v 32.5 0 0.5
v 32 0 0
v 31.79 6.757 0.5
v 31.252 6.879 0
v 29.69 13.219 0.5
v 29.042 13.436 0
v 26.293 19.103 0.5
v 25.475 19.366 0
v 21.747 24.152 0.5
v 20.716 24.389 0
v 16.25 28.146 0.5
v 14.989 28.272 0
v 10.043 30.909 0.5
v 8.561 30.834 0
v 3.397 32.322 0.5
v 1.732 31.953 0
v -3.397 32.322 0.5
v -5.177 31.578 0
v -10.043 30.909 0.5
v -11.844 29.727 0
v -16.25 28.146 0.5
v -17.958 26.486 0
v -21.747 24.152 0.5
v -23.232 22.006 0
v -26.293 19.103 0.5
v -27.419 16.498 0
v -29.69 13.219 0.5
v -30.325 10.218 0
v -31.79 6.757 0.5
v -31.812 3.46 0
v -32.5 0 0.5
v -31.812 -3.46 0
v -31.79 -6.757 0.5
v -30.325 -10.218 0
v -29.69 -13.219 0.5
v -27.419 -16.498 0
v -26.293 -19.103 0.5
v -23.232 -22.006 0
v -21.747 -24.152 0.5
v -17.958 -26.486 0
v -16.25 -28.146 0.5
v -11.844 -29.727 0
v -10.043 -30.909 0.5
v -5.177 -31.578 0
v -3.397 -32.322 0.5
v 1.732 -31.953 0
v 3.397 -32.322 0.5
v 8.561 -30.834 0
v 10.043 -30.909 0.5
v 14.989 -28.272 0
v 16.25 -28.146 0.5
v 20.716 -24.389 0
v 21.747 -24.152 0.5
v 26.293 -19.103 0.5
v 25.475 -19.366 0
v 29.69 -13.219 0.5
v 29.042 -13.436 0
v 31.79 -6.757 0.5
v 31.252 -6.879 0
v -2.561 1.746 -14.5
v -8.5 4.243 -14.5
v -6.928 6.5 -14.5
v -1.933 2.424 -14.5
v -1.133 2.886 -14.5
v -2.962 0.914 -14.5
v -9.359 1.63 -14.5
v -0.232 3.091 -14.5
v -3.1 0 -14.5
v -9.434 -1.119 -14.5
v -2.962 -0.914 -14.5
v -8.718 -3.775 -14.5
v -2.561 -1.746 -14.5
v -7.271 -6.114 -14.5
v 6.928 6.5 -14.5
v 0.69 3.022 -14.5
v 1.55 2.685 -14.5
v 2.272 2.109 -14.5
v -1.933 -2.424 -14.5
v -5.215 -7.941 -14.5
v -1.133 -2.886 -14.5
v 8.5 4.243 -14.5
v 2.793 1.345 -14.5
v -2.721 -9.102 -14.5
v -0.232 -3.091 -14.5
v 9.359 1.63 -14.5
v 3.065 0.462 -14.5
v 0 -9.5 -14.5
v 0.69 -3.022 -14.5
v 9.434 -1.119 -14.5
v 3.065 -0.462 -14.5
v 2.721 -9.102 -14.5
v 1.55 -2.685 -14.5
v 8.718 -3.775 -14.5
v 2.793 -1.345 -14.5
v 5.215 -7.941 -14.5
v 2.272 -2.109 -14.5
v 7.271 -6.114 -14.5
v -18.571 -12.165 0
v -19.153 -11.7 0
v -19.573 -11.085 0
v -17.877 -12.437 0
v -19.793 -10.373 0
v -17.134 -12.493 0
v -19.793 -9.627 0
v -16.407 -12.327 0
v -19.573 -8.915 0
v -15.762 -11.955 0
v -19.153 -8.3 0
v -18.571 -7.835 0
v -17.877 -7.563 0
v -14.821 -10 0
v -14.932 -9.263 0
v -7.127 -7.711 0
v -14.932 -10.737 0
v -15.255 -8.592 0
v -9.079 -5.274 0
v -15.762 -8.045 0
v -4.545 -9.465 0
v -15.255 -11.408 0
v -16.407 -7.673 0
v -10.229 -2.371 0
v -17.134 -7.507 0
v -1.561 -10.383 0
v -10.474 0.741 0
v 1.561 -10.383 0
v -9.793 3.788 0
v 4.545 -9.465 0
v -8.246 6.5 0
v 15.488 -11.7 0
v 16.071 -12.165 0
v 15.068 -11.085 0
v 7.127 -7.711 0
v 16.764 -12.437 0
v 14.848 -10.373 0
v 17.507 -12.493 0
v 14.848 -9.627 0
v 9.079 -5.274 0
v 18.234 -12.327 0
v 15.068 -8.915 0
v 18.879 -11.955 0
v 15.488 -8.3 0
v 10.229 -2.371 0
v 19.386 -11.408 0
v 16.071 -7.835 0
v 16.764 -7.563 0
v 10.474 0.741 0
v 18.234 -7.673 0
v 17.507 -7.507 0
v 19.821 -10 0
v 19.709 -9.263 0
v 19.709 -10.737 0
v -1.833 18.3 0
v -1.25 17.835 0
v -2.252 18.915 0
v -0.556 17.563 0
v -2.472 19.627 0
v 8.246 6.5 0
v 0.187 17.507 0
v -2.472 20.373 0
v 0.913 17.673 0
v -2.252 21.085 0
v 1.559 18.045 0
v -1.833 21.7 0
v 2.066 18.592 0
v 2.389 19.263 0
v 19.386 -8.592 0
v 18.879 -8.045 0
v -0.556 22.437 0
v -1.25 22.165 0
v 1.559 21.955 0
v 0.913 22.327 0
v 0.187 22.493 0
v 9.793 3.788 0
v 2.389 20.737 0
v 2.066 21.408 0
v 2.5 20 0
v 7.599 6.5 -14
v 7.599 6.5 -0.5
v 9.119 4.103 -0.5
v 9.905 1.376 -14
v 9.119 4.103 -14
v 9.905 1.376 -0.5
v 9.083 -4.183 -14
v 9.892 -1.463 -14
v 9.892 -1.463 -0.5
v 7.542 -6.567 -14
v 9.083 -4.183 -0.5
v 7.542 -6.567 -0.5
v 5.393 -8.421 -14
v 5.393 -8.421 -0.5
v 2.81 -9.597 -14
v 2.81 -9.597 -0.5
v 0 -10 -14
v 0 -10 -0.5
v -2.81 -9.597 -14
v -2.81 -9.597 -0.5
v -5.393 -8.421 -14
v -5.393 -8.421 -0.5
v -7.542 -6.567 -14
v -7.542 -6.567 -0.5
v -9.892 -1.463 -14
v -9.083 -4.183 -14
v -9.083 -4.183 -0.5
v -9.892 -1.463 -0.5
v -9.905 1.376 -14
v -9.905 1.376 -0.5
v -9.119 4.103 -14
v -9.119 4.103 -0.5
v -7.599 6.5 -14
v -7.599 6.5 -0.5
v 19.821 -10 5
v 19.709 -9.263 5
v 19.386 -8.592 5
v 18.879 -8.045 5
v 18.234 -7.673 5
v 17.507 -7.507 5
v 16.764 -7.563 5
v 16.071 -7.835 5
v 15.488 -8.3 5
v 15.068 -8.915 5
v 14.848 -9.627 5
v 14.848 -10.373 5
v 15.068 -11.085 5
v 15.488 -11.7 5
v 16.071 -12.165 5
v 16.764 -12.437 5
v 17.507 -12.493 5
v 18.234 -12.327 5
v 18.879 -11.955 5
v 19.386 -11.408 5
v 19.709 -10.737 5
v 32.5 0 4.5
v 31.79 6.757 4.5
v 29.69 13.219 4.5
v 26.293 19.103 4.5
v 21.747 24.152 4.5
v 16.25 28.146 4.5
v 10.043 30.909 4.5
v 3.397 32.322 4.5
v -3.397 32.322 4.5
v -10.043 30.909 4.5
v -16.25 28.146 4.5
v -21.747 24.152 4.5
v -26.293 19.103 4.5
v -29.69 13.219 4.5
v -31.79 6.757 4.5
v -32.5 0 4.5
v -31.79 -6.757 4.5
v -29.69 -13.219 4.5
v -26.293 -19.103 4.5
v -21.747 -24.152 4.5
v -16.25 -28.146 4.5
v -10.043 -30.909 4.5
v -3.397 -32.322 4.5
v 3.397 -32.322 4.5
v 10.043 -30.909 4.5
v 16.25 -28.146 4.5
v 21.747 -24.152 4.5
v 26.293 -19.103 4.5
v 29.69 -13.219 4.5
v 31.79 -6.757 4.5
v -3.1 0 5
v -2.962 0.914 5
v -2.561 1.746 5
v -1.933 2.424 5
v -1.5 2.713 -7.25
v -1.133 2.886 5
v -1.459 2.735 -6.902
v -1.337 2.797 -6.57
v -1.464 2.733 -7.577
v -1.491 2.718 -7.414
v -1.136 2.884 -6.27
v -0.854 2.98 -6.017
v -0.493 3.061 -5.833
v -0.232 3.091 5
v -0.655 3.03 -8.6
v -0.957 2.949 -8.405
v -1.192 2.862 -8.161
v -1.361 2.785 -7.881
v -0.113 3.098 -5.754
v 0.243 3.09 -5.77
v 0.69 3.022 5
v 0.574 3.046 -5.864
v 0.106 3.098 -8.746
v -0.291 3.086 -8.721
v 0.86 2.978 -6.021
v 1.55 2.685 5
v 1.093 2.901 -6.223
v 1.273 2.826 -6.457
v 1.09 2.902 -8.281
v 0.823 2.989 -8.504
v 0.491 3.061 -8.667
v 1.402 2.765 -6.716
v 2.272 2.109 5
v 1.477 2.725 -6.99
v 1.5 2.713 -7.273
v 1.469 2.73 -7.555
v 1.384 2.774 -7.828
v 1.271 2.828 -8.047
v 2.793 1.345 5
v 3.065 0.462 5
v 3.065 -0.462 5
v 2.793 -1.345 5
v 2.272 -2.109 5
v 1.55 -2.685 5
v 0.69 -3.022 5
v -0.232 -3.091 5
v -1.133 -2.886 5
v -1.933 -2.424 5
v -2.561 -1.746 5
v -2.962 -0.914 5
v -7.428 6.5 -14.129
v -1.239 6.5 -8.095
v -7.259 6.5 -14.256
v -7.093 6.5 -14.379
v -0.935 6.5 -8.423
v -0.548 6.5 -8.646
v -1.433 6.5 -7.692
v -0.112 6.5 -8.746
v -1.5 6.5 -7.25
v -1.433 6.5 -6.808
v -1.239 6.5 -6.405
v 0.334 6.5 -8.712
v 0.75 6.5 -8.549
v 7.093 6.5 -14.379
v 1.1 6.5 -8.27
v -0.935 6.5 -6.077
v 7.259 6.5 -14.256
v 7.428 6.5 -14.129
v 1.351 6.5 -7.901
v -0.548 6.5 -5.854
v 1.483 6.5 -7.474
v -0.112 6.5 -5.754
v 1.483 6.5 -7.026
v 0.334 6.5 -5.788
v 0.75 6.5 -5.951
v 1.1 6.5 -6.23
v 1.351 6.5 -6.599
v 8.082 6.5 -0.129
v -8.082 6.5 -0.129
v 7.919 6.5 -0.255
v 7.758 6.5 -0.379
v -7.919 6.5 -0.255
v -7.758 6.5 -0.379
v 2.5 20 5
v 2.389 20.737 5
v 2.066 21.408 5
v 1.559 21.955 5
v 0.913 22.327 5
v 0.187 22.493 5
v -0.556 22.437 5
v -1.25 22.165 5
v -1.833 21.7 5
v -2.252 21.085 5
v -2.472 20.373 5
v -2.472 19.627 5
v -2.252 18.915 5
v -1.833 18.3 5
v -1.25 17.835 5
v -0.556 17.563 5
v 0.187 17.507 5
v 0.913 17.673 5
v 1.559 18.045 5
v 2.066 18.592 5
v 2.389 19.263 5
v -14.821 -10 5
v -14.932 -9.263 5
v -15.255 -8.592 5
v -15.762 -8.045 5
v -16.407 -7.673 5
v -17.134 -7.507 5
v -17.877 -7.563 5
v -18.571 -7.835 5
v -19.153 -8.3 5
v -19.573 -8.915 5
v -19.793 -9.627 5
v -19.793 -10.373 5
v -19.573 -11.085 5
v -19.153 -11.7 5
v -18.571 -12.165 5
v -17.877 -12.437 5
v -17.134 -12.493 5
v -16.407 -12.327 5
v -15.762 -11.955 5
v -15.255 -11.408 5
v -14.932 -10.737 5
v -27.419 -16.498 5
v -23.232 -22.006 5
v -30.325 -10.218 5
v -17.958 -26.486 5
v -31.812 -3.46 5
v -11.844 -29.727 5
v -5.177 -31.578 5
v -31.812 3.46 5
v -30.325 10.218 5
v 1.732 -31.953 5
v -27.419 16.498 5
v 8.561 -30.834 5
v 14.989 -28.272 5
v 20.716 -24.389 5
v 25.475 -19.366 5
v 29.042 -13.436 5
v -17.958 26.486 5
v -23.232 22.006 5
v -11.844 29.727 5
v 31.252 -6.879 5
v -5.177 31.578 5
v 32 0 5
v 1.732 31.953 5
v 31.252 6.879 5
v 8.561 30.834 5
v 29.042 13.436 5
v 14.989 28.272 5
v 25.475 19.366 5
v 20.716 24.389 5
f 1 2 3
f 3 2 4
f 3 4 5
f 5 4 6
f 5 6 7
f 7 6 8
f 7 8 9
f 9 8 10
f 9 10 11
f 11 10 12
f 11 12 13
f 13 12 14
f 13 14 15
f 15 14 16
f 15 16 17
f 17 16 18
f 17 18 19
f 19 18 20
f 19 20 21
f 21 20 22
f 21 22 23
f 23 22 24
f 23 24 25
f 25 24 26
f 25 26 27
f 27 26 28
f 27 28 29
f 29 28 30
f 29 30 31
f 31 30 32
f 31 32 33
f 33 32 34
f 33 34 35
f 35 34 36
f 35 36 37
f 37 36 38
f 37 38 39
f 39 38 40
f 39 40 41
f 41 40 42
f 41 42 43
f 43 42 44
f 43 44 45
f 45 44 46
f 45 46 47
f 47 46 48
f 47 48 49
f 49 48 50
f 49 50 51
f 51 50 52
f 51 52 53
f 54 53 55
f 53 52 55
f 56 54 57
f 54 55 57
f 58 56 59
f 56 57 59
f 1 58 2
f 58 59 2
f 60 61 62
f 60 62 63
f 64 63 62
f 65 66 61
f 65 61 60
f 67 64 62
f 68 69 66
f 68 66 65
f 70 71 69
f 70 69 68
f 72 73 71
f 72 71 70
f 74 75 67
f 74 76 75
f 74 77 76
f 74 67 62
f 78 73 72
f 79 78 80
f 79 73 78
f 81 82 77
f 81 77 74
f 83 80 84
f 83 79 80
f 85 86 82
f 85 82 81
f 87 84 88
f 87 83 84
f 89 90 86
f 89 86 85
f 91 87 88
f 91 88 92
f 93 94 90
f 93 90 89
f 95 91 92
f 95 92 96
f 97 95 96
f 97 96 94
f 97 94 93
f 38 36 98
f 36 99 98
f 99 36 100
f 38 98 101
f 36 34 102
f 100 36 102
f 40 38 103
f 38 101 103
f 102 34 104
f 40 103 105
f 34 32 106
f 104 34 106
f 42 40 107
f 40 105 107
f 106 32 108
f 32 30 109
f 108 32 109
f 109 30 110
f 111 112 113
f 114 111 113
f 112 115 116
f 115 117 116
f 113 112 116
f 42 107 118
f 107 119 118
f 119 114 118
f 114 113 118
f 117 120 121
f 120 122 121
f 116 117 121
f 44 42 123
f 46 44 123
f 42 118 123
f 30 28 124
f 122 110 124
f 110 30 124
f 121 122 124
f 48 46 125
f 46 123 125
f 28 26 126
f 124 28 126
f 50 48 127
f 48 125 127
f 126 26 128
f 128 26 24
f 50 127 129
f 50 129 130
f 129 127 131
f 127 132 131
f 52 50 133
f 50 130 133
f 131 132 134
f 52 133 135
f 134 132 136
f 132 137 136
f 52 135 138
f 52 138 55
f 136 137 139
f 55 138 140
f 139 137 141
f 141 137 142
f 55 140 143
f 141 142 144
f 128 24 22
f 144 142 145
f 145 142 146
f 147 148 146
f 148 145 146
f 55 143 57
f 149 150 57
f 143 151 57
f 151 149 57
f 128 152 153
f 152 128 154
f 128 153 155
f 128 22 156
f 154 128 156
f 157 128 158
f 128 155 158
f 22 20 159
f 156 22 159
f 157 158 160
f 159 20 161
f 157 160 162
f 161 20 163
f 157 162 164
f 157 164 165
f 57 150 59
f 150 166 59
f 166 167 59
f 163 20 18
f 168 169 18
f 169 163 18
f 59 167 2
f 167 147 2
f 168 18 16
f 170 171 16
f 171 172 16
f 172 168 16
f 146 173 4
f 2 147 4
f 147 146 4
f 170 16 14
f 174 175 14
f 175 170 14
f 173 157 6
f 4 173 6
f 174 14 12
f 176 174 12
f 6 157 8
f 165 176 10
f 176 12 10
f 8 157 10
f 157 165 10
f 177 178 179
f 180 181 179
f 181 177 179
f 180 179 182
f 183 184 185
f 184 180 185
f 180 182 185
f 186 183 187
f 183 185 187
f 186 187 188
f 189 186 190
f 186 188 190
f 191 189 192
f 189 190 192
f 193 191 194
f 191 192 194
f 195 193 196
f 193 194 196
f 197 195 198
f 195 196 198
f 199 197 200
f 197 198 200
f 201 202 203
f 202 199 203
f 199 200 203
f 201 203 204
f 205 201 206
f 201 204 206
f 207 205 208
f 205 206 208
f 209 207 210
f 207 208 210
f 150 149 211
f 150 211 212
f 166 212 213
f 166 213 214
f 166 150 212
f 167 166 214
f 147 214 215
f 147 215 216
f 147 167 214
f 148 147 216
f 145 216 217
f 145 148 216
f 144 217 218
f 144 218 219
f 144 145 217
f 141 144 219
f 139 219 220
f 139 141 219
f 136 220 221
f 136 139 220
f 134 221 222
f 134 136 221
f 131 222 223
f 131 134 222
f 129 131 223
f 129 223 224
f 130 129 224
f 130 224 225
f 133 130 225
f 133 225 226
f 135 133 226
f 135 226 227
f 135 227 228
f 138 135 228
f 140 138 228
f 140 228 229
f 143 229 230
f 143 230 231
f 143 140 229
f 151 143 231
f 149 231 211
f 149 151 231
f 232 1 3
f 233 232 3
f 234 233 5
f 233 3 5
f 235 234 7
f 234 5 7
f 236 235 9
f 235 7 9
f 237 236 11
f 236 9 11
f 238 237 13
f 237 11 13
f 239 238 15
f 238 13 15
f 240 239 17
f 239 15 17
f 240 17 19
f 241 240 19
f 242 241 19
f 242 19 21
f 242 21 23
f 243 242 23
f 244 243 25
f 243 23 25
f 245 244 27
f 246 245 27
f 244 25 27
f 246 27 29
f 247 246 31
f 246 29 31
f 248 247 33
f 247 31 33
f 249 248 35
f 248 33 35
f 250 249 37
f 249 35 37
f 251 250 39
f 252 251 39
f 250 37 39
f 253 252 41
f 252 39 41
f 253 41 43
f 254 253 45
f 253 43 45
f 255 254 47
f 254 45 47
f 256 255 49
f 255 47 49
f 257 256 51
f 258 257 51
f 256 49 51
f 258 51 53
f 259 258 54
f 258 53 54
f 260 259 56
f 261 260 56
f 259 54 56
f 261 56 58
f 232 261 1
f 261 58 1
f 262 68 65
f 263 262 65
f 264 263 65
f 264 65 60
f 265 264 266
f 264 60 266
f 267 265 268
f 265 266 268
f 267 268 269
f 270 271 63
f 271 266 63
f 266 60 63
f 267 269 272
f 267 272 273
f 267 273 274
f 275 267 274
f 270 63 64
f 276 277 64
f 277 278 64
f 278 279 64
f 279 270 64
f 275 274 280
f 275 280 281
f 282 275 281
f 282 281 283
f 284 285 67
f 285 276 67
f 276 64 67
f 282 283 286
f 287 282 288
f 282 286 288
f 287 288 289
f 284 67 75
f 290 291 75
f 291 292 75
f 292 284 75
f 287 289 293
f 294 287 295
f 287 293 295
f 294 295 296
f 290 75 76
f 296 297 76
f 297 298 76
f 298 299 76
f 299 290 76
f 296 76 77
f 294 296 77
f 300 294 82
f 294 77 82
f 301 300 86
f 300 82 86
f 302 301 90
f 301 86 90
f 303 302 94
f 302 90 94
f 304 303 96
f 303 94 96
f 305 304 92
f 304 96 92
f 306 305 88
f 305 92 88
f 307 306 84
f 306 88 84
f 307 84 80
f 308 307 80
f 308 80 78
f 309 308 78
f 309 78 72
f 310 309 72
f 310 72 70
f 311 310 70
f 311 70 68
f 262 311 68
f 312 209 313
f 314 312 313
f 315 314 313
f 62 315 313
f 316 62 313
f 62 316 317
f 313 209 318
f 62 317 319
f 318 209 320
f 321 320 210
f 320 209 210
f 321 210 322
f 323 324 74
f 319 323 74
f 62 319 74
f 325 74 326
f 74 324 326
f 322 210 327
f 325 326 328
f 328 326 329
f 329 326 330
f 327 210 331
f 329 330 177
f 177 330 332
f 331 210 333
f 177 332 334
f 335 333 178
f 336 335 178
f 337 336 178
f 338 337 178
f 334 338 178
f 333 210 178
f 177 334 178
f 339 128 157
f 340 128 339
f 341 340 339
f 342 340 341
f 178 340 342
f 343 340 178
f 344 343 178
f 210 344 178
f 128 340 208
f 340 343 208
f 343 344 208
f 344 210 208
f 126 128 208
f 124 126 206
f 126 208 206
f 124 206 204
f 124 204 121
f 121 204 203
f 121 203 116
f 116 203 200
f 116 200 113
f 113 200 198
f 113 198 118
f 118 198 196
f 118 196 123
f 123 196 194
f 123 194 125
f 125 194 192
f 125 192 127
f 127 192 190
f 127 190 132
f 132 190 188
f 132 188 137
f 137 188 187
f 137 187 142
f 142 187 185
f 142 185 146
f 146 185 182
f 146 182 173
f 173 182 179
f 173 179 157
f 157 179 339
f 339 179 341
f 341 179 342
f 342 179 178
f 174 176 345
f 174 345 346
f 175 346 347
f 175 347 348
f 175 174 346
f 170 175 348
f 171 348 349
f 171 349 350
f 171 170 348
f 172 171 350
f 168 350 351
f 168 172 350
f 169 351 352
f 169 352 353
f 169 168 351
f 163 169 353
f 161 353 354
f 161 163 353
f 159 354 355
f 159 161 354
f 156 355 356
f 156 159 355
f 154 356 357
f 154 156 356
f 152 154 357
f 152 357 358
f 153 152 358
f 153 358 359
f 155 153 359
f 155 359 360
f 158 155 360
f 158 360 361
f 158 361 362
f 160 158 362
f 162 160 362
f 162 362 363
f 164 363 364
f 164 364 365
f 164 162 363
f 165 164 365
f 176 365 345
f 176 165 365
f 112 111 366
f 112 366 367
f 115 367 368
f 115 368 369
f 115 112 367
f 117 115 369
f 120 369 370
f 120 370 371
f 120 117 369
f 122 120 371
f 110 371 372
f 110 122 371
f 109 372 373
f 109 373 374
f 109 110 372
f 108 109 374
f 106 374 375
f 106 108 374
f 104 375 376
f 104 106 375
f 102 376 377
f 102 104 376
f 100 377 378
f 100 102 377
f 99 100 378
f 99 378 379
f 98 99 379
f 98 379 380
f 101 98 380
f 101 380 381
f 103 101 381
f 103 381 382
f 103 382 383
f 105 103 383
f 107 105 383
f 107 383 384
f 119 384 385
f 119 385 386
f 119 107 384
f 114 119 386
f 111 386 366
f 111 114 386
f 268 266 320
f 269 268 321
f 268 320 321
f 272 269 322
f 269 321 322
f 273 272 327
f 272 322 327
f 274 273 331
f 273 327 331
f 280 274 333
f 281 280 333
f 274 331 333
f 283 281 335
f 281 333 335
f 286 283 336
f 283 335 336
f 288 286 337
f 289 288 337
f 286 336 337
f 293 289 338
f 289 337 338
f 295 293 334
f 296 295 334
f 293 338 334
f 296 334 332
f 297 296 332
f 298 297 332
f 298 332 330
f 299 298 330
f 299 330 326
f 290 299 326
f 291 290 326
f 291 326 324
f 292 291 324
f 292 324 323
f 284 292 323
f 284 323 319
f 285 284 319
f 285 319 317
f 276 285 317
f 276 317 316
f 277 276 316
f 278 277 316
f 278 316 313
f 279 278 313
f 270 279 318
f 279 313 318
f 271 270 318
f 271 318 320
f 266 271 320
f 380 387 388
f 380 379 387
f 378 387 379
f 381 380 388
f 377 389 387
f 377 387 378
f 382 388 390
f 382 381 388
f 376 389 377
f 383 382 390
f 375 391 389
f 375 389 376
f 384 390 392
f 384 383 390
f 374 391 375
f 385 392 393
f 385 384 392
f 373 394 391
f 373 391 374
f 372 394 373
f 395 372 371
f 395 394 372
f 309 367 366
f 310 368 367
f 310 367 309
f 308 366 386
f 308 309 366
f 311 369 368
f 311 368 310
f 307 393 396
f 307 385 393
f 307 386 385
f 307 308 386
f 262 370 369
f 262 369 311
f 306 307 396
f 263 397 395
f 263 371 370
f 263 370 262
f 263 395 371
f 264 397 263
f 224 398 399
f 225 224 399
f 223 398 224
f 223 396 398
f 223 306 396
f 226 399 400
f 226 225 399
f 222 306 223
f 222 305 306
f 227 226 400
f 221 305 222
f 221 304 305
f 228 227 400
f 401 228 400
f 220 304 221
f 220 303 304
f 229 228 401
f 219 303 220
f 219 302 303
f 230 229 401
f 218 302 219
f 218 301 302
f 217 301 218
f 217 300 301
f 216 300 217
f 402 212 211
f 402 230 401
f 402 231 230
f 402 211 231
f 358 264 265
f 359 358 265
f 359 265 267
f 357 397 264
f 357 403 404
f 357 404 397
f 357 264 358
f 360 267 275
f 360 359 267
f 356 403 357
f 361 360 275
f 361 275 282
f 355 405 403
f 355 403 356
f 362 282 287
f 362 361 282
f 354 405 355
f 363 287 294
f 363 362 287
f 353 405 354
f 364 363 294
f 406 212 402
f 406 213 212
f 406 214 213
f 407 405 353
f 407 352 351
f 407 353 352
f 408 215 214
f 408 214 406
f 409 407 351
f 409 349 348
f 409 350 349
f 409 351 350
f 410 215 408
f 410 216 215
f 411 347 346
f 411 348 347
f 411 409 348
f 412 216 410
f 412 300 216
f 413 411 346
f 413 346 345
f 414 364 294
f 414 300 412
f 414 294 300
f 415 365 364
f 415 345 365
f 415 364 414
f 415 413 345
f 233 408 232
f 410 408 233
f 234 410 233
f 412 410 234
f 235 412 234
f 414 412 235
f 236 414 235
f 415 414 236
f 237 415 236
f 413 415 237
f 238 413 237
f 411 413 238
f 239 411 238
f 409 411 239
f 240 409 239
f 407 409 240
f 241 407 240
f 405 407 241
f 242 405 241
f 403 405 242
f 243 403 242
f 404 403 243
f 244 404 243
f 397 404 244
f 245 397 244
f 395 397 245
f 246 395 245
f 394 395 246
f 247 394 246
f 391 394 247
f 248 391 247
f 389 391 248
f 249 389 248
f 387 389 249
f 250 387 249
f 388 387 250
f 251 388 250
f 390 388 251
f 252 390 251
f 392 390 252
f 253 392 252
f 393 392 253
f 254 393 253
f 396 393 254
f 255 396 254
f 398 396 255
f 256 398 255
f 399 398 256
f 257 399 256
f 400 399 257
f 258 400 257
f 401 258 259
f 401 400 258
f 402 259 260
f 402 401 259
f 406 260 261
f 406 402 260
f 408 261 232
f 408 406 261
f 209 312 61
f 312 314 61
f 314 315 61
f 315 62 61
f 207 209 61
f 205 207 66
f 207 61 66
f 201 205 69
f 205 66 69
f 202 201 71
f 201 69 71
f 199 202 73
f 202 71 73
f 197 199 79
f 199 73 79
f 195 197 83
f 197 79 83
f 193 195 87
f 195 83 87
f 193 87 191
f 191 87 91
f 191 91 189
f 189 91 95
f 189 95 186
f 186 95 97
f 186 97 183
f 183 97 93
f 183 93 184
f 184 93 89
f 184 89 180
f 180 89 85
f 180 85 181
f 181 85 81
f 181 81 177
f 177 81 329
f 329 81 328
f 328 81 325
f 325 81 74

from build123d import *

# Parameters (mm, degrees)
SKETCH1_R           = 32.5
SKETCH1_R_2         = 2.5
BOSS_EXTRUDE1_DEPTH = 5
SKETCH2_R           = 10
BOSS_EXTRUDE2_DEPTH = 14.5
SKETCH3_R           = 3.1
CUT_EXTRUDE1_DEPTH  = 24.5
CUT_EXTRUDE3_START  = -14.5
CUT_EXTRUDE3_DEPTH  = 14.5
SKETCH8_R           = 1.5
CUT_EXTRUDE5_DEPTH  = 5
CHAMFER2_SIZE       = 0.5


with BuildPart() as part:
    # Sketch1 → Boss-Extrude1 (new body)
    with BuildSketch(Plane.XY):
        Circle(SKETCH1_R)
        with Locations((0, 20)):
            Circle(SKETCH1_R_2, mode=Mode.SUBTRACT)
        with Locations((-17.320508076, -10)):
            Circle(SKETCH1_R_2, mode=Mode.SUBTRACT)
        with Locations((17.320508076, -10)):
            Circle(SKETCH1_R_2, mode=Mode.SUBTRACT)
    extrude(amount=BOSS_EXTRUDE1_DEPTH)

    # Sketch2 → Boss-Extrude2 (add)
    with BuildSketch(Plane(origin=(0, 0, 0), x_dir=(-1, 0, 0), z_dir=(0, 0, -1))):
        with Locations(Location((0, 0, 0), (0, 0, 180))):
            Circle(SKETCH2_R)
    extrude(amount=BOSS_EXTRUDE2_DEPTH)

    # Sketch3 → Cut-Extrude1 (cut)
    with BuildSketch(Plane(origin=(0, 0, -14.5), x_dir=(-1, 0, 0), z_dir=(0, 0, -1))):
        Circle(SKETCH3_R)
    extrude(amount=-CUT_EXTRUDE1_DEPTH, mode=Mode.SUBTRACT)

    # Sketch7 → Cut-Extrude3 (cut)
    with BuildSketch(Plane(origin=(0, 0, -14.5), x_dir=(-1, 0, 0), z_dir=(0, 0, -1)).offset(CUT_EXTRUDE3_START)):
        with BuildLine():
            Line((0, 6.5), (-7.599342077, 6.5))
            ThreePointArc((-7.599342077, 6.5), (0, 10), (7.599342077, 6.5))
            Line((7.599342077, 6.5), (0, 6.5))
        make_face()
    extrude(amount=CUT_EXTRUDE3_DEPTH, mode=Mode.SUBTRACT)

    # Sketch8 → Cut-Extrude5 (cut)
    with BuildSketch(Plane(origin=(0, 6.5, 0), x_dir=(1, 0, 0), z_dir=(0, 1, 0))):
        with Locations(Location((0, 7.25, 0), (0, 0, 180))):
            Circle(SKETCH8_R)
    extrude(amount=-CUT_EXTRUDE5_DEPTH, mode=Mode.SUBTRACT)

    # Chamfer2
    chamfer2_edges = [part.edges().sort_by_distance(p)[0] for p in [
        (-32.5, 0, 0),
        (0, -10, -14.5),
        (0, -10, 0),
        (-32.5, 0, 5),
    ]]
    chamfer(chamfer2_edges, length=CHAMFER2_SIZE)


solid = part.part
